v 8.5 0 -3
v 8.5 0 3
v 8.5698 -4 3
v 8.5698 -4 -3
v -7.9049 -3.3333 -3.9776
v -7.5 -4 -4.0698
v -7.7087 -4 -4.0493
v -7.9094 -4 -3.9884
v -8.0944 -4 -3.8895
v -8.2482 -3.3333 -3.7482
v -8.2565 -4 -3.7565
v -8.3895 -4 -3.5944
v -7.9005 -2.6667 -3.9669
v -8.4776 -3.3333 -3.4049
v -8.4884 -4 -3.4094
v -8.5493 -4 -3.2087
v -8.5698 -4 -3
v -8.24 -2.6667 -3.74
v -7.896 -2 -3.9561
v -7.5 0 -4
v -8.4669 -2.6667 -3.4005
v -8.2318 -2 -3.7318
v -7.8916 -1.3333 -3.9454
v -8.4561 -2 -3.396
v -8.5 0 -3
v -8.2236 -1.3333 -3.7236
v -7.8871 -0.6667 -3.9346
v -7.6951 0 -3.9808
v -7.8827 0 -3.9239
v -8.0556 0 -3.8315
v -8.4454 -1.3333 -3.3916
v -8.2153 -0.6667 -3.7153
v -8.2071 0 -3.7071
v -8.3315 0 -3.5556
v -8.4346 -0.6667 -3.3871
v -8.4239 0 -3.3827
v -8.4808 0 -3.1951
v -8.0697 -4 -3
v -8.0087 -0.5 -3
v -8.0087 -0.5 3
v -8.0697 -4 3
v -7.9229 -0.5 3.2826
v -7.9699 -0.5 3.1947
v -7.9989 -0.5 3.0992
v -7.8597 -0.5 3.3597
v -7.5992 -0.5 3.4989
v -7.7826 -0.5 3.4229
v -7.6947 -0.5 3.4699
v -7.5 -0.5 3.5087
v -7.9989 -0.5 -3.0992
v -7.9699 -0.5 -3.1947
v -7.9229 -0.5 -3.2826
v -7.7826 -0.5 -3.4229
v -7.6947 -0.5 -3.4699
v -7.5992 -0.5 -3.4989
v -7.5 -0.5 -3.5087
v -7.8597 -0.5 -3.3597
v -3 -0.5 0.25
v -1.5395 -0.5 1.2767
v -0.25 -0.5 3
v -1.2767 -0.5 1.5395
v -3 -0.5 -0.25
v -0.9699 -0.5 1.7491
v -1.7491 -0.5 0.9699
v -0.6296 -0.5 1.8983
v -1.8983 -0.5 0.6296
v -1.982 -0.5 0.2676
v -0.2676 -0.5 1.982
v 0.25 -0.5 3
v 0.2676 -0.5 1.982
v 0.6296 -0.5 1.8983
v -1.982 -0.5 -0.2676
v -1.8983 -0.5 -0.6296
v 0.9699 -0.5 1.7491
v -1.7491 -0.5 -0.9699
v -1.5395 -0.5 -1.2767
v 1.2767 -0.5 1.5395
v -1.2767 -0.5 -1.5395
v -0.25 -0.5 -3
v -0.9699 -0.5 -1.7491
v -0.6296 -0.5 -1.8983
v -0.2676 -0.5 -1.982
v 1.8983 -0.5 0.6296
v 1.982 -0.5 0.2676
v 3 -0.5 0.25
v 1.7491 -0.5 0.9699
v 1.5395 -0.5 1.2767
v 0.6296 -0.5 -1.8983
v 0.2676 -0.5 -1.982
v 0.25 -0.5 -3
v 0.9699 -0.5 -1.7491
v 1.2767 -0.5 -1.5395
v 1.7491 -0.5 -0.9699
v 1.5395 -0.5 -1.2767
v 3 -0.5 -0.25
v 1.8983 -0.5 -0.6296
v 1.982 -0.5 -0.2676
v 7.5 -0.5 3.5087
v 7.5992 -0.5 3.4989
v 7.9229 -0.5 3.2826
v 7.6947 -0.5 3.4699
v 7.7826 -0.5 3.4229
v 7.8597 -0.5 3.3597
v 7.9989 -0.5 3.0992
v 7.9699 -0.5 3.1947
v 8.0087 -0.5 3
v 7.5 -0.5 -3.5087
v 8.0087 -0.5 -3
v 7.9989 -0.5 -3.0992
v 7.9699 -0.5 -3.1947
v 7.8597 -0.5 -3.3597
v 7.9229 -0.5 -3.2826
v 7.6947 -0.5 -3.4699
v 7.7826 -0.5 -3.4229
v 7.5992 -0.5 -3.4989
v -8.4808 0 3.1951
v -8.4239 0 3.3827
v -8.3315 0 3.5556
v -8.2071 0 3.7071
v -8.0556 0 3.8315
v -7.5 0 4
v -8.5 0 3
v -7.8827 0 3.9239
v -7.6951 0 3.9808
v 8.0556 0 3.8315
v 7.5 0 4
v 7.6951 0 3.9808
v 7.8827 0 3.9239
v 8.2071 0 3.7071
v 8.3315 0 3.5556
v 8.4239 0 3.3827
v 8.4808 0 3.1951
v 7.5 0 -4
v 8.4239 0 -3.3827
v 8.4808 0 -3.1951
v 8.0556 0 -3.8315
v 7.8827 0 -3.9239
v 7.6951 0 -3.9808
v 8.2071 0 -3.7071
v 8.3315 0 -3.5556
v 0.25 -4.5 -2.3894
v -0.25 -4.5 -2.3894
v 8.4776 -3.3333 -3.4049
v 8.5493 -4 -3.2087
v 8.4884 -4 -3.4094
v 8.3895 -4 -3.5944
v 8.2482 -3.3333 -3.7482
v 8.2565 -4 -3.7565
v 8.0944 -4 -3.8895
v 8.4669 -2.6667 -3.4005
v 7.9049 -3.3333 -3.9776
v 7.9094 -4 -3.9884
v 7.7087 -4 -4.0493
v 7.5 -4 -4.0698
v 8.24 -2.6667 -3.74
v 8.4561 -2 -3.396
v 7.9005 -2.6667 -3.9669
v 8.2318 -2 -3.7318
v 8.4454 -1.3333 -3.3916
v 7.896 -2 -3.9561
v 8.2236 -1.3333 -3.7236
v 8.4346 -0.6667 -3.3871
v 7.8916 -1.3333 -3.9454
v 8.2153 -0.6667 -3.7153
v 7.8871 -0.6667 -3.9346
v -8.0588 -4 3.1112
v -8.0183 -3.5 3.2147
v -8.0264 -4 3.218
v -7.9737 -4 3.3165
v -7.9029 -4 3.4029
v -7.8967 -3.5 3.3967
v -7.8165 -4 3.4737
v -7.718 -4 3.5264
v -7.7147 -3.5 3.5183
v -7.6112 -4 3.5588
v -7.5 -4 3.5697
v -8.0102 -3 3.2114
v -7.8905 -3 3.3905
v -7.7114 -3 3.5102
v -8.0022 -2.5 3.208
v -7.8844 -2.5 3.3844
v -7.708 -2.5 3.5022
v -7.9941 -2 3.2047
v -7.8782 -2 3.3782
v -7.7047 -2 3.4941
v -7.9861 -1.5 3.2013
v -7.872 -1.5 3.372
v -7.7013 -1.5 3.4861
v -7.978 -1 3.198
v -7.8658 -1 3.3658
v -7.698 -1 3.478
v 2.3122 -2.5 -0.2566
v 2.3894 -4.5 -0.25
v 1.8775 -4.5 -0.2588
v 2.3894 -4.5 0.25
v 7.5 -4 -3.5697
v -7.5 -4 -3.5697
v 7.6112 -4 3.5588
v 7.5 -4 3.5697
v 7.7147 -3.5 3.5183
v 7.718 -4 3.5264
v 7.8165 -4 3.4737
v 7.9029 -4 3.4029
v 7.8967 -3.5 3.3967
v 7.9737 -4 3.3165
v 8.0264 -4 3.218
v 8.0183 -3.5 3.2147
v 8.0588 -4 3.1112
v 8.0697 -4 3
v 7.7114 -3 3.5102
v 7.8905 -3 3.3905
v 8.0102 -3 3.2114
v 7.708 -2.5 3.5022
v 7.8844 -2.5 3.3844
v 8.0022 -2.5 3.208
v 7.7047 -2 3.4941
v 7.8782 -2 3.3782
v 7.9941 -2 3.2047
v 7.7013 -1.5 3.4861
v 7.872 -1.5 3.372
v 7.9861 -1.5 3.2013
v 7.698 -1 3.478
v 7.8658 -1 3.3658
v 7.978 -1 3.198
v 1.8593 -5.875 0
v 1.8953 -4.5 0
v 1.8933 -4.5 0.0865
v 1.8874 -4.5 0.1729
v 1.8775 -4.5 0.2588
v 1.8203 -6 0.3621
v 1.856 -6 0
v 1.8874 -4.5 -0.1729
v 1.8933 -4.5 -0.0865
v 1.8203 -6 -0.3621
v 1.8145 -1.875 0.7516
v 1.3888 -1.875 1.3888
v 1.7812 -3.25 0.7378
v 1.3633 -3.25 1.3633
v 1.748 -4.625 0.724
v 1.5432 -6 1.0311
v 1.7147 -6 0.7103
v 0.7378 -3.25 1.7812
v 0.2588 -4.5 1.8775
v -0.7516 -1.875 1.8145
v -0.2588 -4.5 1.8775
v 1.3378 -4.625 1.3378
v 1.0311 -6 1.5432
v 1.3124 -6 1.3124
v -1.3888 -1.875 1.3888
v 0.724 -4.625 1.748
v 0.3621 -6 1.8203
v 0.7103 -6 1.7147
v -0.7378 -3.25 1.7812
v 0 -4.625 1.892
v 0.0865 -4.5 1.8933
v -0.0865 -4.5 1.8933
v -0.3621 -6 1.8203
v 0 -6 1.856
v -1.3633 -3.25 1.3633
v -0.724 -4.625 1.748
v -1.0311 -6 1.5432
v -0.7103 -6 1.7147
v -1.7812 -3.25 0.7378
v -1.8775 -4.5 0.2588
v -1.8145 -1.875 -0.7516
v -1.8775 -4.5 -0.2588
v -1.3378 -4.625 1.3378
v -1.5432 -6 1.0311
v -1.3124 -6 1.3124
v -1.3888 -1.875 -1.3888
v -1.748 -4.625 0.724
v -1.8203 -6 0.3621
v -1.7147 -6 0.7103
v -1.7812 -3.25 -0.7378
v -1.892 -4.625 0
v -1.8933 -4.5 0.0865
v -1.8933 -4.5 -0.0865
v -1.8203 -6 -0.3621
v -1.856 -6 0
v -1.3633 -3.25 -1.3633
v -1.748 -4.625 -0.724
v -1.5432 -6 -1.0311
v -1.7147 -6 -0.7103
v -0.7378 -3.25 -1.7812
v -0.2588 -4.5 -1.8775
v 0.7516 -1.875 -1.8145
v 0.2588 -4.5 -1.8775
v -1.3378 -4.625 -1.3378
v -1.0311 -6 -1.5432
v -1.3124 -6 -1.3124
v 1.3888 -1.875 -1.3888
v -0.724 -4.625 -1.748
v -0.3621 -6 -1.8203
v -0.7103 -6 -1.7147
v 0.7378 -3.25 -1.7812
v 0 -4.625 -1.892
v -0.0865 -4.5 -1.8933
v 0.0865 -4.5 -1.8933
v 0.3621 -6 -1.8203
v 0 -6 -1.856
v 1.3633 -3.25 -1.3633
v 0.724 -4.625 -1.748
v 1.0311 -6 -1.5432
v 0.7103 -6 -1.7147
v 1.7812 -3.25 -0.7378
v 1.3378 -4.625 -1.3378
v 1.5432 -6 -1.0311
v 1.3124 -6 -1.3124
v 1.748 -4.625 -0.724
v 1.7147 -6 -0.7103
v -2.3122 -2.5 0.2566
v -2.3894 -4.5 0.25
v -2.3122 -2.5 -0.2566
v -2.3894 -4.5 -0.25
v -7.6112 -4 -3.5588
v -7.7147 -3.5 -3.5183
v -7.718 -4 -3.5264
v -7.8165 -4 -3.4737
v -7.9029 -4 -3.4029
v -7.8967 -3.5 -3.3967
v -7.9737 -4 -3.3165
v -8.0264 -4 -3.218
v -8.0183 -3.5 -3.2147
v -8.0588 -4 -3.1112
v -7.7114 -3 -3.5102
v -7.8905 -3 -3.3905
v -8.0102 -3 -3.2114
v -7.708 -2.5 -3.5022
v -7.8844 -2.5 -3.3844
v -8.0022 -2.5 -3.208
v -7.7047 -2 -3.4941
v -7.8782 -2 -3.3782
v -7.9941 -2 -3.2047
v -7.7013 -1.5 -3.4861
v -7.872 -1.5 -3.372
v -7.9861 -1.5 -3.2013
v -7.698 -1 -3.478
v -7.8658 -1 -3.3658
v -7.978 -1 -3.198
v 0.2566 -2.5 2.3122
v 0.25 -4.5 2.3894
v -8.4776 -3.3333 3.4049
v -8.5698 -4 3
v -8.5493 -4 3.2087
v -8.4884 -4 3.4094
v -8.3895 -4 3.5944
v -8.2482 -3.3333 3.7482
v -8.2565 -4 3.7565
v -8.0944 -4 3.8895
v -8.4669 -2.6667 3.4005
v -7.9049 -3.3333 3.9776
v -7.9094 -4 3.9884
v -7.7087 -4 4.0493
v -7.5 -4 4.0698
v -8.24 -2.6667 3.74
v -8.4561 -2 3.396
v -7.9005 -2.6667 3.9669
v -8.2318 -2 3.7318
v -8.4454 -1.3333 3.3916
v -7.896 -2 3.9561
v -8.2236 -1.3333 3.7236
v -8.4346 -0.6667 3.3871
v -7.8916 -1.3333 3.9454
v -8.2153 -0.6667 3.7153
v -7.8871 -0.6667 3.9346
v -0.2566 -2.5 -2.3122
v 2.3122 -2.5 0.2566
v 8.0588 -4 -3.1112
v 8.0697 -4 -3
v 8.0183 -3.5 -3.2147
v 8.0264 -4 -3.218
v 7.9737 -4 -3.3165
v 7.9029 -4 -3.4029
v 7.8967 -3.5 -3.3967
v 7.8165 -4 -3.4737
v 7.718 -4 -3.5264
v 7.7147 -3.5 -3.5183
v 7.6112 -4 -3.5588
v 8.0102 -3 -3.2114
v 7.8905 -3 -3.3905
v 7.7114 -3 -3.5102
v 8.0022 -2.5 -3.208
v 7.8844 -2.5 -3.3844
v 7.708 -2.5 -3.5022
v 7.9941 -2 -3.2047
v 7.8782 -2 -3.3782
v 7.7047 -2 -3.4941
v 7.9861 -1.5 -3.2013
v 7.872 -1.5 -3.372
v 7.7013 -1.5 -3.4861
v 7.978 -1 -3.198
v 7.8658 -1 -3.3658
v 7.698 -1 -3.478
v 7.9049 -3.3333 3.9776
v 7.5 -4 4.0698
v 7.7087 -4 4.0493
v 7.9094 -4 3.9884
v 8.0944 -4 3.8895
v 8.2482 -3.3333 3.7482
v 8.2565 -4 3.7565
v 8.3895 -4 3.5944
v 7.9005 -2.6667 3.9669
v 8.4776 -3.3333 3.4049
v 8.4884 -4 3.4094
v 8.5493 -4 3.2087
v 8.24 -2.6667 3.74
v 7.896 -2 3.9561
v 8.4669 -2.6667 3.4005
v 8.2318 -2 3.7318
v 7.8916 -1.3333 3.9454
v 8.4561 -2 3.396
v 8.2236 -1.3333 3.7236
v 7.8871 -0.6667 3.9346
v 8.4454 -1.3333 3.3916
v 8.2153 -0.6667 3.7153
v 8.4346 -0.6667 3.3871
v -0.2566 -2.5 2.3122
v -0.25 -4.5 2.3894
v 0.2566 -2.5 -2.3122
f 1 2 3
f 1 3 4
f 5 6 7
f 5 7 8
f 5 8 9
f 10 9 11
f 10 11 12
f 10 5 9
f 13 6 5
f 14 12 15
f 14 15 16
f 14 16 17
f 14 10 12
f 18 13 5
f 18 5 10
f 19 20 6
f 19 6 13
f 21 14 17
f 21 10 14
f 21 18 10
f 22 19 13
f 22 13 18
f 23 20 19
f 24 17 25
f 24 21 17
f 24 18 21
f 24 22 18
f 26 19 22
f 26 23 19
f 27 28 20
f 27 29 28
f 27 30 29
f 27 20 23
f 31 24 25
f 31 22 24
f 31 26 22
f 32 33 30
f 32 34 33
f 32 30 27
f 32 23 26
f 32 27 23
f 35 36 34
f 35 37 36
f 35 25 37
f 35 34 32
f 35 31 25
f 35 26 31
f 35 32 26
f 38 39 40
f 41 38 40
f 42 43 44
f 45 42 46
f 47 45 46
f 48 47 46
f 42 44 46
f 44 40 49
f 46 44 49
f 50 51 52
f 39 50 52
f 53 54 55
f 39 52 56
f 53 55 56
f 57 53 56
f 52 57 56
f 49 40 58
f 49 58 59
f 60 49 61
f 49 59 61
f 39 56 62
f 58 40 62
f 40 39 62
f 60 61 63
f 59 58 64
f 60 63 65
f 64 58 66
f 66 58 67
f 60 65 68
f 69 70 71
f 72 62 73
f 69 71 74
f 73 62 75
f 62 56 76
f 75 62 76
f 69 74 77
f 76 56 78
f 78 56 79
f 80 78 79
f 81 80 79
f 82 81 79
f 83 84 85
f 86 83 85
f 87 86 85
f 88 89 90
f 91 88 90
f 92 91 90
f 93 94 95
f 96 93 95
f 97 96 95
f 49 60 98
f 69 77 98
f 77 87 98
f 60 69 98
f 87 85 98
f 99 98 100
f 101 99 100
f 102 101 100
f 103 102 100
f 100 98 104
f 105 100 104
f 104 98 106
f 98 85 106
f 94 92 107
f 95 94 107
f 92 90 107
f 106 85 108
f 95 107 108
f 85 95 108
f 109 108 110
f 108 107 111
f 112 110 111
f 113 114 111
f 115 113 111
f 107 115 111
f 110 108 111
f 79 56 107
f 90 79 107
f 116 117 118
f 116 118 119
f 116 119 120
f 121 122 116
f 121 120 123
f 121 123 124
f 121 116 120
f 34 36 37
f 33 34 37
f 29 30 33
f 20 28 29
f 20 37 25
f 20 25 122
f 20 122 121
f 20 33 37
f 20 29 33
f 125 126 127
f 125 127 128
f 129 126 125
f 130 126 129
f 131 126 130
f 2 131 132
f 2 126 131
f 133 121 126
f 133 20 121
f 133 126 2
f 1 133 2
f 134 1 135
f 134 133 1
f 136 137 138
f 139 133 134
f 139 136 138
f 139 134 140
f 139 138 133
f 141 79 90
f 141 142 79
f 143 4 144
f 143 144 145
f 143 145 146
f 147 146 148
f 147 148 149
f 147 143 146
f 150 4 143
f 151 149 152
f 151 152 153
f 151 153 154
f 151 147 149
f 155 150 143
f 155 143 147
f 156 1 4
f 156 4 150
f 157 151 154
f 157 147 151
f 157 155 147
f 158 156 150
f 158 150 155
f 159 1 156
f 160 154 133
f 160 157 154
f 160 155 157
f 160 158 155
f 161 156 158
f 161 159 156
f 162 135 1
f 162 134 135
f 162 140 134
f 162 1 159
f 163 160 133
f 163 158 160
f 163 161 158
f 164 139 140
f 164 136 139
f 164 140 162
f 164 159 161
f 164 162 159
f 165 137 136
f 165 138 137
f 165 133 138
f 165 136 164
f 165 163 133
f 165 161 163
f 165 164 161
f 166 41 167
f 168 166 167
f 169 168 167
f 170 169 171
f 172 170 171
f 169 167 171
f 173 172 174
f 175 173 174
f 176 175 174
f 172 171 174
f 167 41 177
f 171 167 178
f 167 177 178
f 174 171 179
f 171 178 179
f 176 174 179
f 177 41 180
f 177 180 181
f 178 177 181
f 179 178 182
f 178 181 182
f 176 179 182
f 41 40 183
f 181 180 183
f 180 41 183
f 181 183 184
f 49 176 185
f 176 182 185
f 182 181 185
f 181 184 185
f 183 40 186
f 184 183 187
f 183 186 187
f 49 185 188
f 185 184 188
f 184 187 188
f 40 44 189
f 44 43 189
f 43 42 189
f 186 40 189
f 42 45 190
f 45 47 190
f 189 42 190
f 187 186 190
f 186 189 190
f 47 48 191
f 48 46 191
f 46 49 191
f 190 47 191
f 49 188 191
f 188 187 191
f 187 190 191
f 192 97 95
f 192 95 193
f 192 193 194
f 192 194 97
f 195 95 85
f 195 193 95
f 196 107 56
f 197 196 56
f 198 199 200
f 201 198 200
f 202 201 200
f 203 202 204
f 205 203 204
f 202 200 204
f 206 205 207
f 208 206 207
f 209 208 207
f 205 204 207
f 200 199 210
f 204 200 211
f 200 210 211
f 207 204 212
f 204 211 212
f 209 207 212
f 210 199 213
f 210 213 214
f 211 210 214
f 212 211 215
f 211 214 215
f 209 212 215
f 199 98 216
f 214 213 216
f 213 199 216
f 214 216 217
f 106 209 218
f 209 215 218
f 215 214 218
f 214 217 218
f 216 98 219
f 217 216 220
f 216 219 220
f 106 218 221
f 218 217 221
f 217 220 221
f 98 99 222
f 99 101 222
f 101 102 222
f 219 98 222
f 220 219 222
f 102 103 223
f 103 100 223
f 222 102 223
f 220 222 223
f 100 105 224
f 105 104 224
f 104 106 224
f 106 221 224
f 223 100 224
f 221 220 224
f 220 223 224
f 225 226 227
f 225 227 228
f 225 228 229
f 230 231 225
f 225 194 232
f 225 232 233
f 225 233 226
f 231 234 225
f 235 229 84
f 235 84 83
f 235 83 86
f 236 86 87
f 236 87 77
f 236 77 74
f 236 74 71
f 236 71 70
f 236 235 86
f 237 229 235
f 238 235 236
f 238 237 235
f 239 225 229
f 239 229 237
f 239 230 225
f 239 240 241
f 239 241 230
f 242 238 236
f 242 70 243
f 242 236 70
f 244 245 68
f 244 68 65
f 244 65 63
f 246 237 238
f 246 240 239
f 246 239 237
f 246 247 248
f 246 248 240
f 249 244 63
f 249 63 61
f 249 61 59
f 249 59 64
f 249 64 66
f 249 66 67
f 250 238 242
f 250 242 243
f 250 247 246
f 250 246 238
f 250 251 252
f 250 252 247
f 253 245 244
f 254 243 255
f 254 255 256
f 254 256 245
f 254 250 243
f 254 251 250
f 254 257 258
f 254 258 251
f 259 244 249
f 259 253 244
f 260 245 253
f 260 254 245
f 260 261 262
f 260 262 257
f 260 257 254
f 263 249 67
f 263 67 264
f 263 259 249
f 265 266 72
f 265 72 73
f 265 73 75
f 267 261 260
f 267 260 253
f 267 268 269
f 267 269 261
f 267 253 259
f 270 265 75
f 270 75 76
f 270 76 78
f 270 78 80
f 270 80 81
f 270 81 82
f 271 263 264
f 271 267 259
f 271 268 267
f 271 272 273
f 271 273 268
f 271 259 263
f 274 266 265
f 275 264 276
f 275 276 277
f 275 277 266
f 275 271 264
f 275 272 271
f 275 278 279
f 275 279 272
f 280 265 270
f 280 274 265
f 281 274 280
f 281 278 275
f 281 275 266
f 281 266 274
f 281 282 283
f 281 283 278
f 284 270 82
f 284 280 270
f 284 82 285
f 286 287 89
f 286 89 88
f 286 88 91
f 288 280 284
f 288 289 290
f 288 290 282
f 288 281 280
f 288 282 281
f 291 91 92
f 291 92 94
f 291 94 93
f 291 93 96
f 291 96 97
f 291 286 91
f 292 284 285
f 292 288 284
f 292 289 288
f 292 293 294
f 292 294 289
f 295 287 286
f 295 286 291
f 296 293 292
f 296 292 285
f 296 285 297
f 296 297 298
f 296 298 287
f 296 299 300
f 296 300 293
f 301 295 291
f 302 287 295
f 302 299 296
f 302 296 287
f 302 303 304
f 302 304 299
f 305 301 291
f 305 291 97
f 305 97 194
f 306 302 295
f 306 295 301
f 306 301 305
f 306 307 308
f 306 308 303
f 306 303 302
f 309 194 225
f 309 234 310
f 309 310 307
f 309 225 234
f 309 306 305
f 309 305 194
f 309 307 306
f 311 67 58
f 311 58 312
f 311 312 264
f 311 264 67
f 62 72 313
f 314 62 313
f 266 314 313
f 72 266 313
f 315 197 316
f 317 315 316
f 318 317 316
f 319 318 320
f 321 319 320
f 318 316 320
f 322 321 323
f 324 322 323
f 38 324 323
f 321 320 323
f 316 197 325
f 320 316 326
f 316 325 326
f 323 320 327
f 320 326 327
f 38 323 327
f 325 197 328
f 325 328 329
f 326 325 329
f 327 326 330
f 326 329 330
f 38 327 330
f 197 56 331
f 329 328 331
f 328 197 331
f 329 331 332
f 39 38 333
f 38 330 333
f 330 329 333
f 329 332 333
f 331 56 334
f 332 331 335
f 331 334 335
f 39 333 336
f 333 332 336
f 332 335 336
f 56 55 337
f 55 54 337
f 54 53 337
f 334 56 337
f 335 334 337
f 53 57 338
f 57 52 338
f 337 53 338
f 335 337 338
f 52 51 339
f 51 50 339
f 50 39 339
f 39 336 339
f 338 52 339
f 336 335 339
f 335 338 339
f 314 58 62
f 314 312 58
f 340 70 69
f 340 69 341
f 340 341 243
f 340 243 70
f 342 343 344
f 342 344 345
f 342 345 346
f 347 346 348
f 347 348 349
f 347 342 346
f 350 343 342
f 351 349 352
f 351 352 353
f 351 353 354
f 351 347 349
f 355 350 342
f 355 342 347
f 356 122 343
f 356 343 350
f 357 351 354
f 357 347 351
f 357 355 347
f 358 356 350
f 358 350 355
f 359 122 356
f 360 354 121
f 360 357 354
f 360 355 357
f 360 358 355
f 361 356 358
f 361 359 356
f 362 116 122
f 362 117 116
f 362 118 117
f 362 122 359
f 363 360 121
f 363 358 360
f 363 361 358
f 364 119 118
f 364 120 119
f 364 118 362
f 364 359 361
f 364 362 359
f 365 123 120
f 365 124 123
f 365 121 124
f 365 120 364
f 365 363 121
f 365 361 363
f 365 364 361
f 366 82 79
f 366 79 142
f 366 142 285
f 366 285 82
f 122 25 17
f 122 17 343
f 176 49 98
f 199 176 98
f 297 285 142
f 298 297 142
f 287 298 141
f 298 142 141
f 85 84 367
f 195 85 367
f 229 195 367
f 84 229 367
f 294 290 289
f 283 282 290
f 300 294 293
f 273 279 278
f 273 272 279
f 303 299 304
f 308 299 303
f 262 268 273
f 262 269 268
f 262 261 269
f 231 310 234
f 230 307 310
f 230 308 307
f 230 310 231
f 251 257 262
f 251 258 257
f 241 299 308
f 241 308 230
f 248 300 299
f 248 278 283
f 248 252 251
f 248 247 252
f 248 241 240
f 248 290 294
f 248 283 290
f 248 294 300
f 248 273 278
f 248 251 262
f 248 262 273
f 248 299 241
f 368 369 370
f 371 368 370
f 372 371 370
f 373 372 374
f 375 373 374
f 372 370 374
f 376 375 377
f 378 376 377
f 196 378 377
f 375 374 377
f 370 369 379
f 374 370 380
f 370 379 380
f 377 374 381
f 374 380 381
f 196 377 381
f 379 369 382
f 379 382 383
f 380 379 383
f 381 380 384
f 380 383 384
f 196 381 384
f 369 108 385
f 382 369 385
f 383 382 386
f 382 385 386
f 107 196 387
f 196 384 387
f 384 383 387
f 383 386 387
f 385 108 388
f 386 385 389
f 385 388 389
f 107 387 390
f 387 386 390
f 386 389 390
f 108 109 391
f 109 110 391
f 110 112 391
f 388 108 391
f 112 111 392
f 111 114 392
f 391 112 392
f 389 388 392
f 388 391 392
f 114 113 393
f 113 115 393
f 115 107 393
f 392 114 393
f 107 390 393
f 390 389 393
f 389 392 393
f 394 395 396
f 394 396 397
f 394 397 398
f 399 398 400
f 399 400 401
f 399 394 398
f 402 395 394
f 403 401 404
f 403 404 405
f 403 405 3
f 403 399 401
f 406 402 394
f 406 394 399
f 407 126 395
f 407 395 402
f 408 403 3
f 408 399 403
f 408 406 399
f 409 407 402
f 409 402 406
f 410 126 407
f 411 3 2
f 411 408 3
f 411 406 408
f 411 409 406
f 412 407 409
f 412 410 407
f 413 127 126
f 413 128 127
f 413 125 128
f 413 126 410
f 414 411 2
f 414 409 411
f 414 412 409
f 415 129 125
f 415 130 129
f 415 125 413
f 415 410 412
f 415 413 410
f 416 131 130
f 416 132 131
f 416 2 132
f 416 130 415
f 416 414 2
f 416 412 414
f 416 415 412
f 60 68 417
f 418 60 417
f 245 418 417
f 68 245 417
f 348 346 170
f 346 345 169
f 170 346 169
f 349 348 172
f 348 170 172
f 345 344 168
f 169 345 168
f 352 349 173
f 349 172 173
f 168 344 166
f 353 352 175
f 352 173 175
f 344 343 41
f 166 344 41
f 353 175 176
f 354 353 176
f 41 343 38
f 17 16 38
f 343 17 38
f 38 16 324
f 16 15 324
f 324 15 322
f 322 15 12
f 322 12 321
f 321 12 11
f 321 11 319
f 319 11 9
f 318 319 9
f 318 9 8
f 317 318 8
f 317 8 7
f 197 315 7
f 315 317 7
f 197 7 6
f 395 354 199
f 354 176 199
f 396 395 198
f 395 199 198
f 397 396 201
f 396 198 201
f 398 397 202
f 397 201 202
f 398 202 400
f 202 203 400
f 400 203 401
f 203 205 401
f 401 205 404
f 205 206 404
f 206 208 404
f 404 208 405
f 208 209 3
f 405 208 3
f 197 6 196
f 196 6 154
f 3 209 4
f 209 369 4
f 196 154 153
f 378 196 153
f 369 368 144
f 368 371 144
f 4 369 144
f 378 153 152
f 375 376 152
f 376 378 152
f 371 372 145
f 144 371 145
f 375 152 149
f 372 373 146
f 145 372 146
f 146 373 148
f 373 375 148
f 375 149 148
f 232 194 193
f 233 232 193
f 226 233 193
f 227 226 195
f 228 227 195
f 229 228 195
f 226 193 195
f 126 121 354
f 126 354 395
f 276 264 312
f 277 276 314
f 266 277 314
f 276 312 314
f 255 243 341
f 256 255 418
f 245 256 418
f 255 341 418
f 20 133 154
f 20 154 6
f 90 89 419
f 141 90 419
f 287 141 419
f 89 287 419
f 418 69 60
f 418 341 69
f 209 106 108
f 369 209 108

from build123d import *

# Parameters (mm, degrees)
BOSS_EXTRUDE1_DEPTH = 4
BOSS_EXTRUDE1_DRAFT = 1
SHELL1_T            = -0.5
SKETCH2_R           = 2
BOSS_EXTRUDE2_DEPTH = 5.5
BOSS_EXTRUDE2_TAPER = 1.5
CIRPATTERN1_COUNT   = 4


with BuildPart() as part:
    # Sketch1 → Boss-Extrude1 (with draft: the straight prism first)
    with BuildSketch(Plane(origin=(0, 0, 0), x_dir=(1, 0, 0), z_dir=(0, 1, 0))):
        with BuildLine():
            Line((-7.5, -4), (7.5, -4))
            ThreePointArc((7.5, -4), (8.207106781, -3.707106781), (8.5, -3))
            Line((8.5, -3), (8.5, 3))
            ThreePointArc((8.5, 3), (8.207106781, 3.707106781), (7.5, 4))
            Line((7.5, 4), (-7.5, 4))
            ThreePointArc((-7.5, 4), (-8.207106781, 3.707106781), (-8.5, 3))
            Line((-8.5, 3), (-8.5, -3))
            ThreePointArc((-8.5, -3), (-8.207106781, -3.707106781), (-7.5, -4))
        make_face()
    extrude(amount=-BOSS_EXTRUDE1_DEPTH)
    # Boss-Extrude1: the draft: its side faces are tilted about the plane it starts from
    boss_extrude1_sides = [part.faces().sort_by_distance(p)[0] for p in [
        (0, -2, 4),
        (8.207106781, -2, 3.707106781),
        (8.5, -2, 0),
        (8.207106781, -2, -3.707106781),
        (0, -2, -4),
        (-8.207106781, -2, -3.707106781),
        (-8.5, -2, 0),
        (-8.207106781, -2, 3.707106781),
    ]]
    draft(boss_extrude1_sides, Plane(origin=(0, 0, 0), x_dir=(1, 0, 0), z_dir=(0, 1, 0)), BOSS_EXTRUDE1_DRAFT)

    # Shell1
    shell1_openings = [part.faces().sort_by_distance(p)[0] for p in [
        (0, -4, 0),
    ]]
    offset(amount=SHELL1_T, openings=shell1_openings, kind=Kind.INTERSECTION)

    # Sketch2 → Boss-Extrude2 (add)
    with BuildSketch(Plane.XZ.offset(0.5)):
        Circle(SKETCH2_R)
    extrude(amount=BOSS_EXTRUDE2_DEPTH, taper=BOSS_EXTRUDE2_TAPER)

    # Rib1: read off the stored shape, not the designer's step
    # Rib1: loft between two sections, ruled curve by curve
    rib1_from = [
        Edge.make_line((1.982021382, -0.5, 0.267565397), (3, -0.5, 0.25)),
        Edge.make_line((1.982021382, -0.5, -0.267565397), (3, -0.5, -0.25)),
        Edge.make_line((3, -0.5, -0.25), (3, -0.5, 0.25)),
        Edge.make_line((1.982021382, -0.5, -0.267565397), (1.982021382, -0.5, 0.267565397)),
    ]
    rib1_to = [
        Edge.make_line((1.877498903, -4.5, 0.258832698), (2.38938588, -4.5, 0.25)),
        Edge.make_line((1.877498903, -4.5, -0.258832698), (2.38938588, -4.5, -0.25)),
        Edge.make_line((2.38938588, -4.5, -0.25), (2.38938588, -4.5, 0.25)),
        Edge.make_line((1.877498903, -4.5, -0.258832698), (1.877498903, -4.5, 0.258832698)),
    ]
    rib1 = Solid(Shell([*[Face.make_surface_from_curves(rib1_from[k], rib1_to[k]) for k in range(4)], Face(Wire(rib1_from)), Face(Wire(rib1_to))]))
    add(rib1)

    # CirPattern1: Rib1 ×4 about axis
    cirpattern1_axis = Axis((0, 0, 0), (0, 1, 0))
    for i in range(1, CIRPATTERN1_COUNT):
        add(rib1.rotate(cirpattern1_axis, i * 360 / CIRPATTERN1_COUNT))


solid = part.part
